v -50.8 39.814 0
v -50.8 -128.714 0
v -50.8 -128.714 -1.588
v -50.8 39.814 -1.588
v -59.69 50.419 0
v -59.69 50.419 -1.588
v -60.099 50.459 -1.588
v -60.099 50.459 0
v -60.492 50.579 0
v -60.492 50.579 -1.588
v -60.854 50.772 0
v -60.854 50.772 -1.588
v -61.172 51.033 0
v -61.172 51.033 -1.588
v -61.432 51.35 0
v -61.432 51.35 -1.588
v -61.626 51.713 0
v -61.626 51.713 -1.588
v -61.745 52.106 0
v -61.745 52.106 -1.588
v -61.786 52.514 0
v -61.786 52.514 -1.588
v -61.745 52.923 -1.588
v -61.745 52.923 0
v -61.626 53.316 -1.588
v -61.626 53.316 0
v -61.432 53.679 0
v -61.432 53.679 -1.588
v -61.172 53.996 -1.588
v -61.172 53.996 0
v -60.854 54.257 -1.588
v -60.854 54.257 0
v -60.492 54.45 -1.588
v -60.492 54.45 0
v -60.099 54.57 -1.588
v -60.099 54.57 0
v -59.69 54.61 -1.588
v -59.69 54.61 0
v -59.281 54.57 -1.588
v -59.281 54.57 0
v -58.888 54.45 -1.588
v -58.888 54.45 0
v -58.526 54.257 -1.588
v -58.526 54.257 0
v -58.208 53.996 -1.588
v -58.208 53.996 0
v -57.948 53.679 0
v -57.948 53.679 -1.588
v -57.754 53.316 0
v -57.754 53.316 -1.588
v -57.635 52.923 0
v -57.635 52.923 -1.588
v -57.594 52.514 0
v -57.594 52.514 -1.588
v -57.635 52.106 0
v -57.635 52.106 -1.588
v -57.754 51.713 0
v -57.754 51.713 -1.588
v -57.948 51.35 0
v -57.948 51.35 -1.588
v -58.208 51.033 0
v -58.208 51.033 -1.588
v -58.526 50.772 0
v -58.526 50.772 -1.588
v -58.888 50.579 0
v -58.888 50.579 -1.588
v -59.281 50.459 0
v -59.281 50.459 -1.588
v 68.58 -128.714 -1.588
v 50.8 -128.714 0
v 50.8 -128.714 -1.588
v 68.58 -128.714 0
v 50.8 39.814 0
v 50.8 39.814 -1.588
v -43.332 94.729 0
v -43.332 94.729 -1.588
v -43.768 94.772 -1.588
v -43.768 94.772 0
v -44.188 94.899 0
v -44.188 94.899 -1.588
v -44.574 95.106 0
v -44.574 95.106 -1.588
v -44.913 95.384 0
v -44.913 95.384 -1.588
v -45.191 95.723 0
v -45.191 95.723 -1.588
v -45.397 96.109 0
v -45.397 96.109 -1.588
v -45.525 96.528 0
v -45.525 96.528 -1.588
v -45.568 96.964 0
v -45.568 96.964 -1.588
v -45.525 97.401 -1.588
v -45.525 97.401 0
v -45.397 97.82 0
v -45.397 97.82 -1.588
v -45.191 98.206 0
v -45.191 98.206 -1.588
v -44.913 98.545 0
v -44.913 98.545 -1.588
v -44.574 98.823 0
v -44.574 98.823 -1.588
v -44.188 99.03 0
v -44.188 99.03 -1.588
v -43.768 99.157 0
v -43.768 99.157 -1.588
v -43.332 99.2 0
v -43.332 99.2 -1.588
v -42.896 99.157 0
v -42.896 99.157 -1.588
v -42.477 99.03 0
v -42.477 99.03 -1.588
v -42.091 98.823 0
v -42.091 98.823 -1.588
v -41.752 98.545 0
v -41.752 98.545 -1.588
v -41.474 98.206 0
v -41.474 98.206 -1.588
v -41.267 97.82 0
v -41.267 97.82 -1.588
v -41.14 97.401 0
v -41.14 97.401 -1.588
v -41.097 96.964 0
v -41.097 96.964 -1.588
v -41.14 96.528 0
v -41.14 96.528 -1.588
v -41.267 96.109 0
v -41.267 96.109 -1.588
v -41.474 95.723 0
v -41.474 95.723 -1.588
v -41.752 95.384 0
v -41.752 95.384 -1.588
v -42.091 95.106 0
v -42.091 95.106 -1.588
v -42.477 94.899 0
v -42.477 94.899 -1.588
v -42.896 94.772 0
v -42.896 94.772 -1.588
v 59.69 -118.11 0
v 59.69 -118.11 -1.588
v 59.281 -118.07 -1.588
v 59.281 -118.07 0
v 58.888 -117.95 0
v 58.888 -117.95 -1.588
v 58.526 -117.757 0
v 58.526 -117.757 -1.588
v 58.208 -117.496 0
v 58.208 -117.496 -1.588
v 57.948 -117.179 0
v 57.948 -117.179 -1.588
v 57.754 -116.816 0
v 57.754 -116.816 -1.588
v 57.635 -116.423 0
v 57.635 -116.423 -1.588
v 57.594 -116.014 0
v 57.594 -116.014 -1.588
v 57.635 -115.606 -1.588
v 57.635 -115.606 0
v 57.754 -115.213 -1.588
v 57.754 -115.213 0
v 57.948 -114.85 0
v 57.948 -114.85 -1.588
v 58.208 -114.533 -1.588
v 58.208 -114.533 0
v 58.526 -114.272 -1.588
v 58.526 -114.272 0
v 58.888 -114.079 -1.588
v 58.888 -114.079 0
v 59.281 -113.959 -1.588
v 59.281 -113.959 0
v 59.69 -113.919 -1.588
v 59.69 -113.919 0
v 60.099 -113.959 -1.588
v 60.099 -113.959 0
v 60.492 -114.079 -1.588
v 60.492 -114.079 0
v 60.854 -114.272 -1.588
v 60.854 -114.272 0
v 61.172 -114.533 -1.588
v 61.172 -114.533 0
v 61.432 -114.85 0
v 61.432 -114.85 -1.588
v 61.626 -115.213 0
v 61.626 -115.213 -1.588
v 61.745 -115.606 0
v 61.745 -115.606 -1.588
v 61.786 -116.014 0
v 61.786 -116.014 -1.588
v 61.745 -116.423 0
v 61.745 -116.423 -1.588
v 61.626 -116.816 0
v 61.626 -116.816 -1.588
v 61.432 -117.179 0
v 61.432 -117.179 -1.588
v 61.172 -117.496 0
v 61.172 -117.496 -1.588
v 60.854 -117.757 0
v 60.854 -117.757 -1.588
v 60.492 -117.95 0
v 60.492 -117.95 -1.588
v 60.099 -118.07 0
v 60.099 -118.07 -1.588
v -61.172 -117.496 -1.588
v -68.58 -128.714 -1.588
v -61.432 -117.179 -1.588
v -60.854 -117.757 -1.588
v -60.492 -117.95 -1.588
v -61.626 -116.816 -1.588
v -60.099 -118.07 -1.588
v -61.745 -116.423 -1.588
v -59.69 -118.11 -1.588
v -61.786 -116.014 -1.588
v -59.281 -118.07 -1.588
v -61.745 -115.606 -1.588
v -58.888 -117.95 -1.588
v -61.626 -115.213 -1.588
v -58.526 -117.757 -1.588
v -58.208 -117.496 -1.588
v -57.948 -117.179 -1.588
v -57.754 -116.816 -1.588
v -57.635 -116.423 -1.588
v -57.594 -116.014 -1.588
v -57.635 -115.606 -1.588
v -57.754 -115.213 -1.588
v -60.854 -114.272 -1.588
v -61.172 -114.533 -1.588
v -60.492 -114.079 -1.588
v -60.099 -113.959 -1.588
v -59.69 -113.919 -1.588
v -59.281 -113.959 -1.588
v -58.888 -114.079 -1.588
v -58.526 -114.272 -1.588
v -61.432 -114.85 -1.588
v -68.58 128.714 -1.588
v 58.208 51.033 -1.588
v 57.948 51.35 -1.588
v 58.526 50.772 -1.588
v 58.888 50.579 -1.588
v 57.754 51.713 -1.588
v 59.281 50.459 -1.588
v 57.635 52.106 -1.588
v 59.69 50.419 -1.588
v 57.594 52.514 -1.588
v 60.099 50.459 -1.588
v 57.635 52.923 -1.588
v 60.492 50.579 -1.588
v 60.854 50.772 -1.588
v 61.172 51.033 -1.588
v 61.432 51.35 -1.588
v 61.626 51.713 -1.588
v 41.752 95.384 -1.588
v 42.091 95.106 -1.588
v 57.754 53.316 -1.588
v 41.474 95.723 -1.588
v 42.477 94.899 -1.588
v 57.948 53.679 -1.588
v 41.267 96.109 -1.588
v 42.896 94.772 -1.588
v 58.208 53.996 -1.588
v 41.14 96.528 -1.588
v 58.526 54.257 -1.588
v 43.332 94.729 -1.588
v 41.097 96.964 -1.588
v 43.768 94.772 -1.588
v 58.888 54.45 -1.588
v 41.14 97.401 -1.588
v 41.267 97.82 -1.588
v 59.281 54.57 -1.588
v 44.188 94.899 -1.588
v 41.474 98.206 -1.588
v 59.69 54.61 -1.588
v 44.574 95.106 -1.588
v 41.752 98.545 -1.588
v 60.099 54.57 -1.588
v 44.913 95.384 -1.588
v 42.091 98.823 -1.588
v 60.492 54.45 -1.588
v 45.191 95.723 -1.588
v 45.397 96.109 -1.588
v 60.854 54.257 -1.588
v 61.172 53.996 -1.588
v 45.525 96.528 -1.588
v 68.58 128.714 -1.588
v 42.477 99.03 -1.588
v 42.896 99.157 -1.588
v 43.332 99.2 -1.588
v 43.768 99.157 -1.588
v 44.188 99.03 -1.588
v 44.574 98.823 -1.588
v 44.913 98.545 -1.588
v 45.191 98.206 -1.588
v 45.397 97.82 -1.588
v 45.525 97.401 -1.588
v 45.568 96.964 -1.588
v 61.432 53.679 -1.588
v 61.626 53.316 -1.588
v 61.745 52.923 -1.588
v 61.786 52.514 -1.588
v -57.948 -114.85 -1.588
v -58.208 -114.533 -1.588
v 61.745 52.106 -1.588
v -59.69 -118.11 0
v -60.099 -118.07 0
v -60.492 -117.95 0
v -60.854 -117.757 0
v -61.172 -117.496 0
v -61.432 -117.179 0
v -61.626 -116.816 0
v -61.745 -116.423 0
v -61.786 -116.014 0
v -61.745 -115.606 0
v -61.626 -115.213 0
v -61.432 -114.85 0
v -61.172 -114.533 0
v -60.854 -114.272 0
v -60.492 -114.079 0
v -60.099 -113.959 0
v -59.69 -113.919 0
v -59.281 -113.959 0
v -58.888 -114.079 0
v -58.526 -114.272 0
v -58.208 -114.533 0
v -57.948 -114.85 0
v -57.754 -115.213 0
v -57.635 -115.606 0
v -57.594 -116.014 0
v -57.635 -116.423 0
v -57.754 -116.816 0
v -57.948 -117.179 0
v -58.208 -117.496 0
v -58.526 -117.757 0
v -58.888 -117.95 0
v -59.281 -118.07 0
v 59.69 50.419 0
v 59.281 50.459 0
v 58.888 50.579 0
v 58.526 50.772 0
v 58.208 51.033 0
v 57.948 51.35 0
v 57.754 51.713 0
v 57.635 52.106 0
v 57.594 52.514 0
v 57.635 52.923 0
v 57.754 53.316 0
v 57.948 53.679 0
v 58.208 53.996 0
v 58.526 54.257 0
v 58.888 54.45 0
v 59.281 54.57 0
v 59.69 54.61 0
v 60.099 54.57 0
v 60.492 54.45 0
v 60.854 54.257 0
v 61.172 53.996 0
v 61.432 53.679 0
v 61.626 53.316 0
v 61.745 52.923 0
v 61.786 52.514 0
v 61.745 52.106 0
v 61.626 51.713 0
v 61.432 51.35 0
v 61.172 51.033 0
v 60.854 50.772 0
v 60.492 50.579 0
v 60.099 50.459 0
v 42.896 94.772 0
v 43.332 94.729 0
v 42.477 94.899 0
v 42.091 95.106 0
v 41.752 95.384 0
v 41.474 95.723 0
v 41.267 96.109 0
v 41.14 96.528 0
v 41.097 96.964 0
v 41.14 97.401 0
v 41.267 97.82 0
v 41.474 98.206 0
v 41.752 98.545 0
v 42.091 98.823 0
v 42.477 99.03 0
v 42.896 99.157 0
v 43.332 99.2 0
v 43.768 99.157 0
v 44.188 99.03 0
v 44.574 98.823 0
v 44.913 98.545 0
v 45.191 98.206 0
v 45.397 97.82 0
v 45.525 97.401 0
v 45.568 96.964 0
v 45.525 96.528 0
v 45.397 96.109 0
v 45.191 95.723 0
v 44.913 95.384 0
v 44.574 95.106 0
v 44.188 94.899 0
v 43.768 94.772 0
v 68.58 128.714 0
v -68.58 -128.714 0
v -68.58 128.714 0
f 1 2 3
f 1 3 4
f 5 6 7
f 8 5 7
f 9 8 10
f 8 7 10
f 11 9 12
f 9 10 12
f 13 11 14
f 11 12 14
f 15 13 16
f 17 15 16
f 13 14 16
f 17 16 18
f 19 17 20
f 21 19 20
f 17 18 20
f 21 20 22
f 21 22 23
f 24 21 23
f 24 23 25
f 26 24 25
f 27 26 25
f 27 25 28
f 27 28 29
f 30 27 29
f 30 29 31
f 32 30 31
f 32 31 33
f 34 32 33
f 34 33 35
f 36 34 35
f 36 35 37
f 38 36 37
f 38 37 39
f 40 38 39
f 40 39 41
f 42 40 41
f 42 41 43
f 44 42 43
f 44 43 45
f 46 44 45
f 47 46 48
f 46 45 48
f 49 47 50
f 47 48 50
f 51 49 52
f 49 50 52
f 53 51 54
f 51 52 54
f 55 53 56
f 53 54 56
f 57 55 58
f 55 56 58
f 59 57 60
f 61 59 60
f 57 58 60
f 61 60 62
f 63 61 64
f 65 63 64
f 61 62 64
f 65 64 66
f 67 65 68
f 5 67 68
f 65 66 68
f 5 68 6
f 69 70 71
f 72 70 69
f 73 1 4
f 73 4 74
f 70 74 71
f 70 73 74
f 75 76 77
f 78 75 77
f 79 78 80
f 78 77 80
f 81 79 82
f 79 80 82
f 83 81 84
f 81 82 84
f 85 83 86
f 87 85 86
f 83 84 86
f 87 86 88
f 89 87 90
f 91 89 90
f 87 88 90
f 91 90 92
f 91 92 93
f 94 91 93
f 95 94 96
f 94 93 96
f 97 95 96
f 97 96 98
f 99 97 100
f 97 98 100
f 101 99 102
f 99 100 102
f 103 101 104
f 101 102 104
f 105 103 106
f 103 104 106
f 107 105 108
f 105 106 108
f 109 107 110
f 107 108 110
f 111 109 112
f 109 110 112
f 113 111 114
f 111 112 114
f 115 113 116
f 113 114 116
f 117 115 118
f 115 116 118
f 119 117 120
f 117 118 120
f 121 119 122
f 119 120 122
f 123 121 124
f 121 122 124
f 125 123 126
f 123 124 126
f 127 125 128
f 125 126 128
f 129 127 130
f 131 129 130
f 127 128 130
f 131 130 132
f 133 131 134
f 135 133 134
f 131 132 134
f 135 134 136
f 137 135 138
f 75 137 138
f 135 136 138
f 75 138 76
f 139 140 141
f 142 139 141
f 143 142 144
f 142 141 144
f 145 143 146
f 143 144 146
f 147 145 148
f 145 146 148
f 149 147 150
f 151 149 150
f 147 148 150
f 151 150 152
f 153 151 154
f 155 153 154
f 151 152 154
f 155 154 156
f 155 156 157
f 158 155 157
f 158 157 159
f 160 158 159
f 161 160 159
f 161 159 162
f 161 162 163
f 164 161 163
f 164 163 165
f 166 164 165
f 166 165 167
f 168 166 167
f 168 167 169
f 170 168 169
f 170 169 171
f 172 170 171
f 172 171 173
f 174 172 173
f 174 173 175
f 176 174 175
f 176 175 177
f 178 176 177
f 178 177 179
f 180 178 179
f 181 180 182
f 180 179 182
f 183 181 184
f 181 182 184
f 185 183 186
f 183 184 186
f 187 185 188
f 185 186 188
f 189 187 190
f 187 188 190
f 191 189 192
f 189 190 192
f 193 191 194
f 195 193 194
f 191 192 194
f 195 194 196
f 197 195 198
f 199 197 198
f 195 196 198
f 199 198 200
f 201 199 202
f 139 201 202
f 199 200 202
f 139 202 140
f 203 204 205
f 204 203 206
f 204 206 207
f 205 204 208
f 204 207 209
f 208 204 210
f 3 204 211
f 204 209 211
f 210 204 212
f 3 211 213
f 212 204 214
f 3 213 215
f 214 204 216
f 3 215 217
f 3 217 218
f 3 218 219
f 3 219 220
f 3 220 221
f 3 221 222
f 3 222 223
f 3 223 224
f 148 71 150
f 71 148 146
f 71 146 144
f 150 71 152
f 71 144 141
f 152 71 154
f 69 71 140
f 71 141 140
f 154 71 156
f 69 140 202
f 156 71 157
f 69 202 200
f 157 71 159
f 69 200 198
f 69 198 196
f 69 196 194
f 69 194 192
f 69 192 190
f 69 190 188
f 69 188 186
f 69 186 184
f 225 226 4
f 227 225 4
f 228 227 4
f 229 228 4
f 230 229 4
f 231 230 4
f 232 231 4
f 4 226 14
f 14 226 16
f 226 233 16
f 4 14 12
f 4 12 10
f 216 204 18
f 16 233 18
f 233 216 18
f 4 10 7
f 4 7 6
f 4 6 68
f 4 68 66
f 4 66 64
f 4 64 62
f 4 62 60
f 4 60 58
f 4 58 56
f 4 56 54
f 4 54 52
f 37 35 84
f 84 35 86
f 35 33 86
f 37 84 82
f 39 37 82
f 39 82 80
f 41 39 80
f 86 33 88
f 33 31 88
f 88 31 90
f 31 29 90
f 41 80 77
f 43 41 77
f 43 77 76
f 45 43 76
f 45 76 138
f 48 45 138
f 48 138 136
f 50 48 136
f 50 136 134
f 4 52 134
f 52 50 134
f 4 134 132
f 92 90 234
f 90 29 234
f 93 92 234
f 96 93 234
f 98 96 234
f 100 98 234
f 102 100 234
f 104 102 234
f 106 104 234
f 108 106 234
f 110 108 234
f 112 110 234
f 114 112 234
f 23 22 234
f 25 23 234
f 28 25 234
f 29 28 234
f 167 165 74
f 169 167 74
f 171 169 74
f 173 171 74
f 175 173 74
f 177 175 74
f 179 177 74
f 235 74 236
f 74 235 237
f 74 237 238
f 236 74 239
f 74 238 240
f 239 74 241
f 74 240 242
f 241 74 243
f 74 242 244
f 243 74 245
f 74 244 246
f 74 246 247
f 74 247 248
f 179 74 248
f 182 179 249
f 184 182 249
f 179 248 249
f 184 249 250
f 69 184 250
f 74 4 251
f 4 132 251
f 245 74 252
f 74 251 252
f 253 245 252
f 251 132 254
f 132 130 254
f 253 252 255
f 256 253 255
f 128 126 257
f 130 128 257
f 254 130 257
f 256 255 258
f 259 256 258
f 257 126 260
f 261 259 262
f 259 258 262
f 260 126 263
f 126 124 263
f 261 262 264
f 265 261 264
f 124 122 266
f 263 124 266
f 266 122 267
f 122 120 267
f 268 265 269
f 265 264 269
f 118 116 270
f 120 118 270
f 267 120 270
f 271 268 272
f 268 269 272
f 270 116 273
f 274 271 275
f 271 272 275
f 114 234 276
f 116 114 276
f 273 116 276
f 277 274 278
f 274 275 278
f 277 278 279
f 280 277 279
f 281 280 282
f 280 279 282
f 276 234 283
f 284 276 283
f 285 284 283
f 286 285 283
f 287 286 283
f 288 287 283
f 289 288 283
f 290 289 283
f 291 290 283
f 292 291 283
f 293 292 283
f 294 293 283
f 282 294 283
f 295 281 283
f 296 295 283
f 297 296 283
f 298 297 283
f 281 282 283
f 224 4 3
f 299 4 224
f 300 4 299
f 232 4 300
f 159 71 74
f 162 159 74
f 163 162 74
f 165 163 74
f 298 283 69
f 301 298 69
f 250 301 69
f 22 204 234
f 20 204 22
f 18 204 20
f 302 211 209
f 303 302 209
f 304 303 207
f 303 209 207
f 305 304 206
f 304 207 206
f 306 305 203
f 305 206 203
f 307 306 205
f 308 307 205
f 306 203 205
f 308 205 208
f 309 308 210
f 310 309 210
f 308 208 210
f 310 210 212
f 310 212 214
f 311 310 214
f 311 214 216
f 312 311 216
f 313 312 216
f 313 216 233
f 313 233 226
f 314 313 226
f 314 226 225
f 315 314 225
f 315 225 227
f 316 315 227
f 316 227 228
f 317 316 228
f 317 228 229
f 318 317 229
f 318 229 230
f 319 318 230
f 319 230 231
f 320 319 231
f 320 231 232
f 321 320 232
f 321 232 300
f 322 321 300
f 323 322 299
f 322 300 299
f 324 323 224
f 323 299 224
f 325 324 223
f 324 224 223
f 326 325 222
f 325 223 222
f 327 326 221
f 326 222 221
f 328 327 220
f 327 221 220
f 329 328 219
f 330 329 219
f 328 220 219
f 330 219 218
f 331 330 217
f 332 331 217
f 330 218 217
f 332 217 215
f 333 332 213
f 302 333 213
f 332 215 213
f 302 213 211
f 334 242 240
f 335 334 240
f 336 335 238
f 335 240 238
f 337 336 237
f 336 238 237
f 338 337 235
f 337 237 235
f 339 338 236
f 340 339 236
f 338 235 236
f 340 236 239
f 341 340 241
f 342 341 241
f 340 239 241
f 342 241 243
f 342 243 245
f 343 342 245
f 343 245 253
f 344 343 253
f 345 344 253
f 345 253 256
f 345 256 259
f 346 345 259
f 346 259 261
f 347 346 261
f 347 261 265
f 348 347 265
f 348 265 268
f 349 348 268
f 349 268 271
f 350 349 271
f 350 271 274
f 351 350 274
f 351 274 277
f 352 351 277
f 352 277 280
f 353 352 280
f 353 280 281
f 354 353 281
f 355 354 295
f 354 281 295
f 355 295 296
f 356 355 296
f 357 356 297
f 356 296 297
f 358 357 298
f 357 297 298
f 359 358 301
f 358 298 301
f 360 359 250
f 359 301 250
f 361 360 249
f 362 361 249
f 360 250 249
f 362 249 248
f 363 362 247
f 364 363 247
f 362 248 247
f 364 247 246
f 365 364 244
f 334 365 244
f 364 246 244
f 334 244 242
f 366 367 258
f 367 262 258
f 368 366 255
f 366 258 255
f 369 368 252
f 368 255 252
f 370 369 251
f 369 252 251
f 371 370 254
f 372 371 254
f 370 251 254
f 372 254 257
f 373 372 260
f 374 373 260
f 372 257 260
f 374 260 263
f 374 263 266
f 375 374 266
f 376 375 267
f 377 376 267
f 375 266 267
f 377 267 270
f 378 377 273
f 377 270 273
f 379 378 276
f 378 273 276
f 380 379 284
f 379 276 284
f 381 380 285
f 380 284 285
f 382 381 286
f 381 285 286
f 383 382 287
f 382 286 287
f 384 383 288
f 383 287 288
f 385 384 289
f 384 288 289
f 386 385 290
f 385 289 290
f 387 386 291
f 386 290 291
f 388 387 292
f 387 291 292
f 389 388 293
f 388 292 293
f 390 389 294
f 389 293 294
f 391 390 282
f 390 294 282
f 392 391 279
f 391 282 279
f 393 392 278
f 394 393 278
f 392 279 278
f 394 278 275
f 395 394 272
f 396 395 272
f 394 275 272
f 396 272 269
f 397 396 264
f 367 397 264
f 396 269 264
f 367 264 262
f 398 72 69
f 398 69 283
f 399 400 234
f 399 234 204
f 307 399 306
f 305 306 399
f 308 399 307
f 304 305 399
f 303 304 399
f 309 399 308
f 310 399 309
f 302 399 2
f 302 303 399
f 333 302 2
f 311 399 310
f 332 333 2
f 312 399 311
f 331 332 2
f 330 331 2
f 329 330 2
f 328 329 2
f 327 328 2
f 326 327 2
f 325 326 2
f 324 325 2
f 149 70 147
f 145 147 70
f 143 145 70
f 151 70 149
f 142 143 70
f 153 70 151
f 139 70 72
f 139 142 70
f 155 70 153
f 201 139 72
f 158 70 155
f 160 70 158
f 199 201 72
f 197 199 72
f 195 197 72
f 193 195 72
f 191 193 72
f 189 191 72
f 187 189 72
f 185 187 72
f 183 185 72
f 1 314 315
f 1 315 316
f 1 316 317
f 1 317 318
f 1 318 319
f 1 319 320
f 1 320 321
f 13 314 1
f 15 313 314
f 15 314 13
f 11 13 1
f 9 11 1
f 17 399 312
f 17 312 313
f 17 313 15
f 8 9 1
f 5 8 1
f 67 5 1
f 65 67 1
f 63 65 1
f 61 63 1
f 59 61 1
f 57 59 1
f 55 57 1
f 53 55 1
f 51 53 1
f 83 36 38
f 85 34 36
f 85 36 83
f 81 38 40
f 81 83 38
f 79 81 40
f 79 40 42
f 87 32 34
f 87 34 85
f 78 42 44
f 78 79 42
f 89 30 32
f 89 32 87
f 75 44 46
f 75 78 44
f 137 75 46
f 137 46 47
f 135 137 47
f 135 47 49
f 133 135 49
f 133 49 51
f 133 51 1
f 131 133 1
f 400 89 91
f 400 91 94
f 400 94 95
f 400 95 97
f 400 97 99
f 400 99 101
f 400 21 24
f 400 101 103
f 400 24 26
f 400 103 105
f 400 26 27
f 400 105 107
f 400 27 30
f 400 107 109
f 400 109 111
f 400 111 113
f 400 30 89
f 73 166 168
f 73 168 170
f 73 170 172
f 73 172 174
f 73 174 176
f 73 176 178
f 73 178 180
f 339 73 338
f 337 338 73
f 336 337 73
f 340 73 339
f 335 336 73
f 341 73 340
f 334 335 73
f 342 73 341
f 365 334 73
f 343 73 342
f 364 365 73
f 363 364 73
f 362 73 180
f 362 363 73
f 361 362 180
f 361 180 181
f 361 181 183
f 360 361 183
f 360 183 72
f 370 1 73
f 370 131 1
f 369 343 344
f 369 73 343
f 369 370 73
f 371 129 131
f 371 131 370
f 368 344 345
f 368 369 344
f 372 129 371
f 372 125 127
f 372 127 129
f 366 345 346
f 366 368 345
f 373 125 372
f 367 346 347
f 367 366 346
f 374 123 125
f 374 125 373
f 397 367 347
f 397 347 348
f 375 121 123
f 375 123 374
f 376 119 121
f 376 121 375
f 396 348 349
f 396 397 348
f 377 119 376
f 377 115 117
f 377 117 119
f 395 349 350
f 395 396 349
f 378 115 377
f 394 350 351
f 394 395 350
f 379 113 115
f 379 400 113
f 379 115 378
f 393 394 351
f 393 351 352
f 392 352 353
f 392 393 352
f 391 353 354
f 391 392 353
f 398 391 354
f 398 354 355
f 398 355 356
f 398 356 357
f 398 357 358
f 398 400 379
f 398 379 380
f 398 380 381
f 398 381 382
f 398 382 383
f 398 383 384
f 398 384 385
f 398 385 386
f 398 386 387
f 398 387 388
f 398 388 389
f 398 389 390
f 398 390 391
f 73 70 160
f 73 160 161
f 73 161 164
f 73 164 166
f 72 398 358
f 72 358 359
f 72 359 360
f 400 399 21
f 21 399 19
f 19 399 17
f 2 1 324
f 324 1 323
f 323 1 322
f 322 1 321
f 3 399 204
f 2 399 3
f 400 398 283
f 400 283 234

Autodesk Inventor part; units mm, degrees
ref_plane "YZ Plane" through (0, 0, 0) normal (1, 0, 0) x (0, 1, 0)
ref_plane "XZ Plane" through (0, 0, 0) normal (0, 1, 0) x (-1, 0, 0)
ref_plane "XY Plane" through (0, 0, 0) normal (0, 0, 1) x (1, 0, 0)
sketch "Sketch1" plane through (0, 0, 0) normal (0, 0, 1) x (1, 0, 0)
  line L0 (-68.58, -128.7145) -> (68.58, -128.7145)
  line L1 (68.58, -128.7145) -> (68.58, 128.7145)
  line L2 (68.58, 128.7145) -> (-68.58, 128.7145)
  line L3 (-68.58, 128.7145) -> (-68.58, -128.7145)
  line L4 (-68.58, -128.7145) -> (68.58, 128.7145) construction
  line L5 (68.58, -128.7145) -> (-68.58, 128.7145) construction
  point P0 (0, 0)
  dimension "d0" = 137.16
  dimension "d1" = 257.429
extrude "Extrusion1" add sketch "Sketch1" against normal blind 1.5875
sketch "Sketch2" plane through (0, 0, 0) normal (0, 0, 1) x (1, 0, 0)
  circle A0 centre (-59.69, 52.5145) radius 2.0955
  line L0 (-68.58, 128.7145) -> (-68.58, -128.7145) projected
  line L1 (-68.58, 128.7145) -> (68.58, 128.7145) projected
  circle A1 centre (59.69, 52.5145) radius 2.0955
  line L2 (68.58, -128.7145) -> (68.58, 128.7145) projected
  circle A2 centre (-59.69, -116.0145) radius 2.0955
  circle A3 centre (59.69, -116.0145) radius 2.0955
  line L3 (-68.58, -128.7145) -> (68.58, -128.7145) projected
  point P0 (0, 0)
  dimension "d4" = 8.89
  dimension "d5" = 76.2
  dimension "d6" = 76.2
  dimension "d7" = 8.89
  dimension "d8" = 4.191
  dimension "d9" = 12.7
  dimension "d10" = 8.89
  dimension "d11" = 8.89
  dimension "d12" = 12.7
  dimension "d13" = 4.191
  dimension "d21" = 4.191
  dimension "d22" = 4.191
hole "Hole1" at (-59.69, 52.5145, 0) at (59.69, 52.5145, 0) at (-59.69, -116.0145, 0) at (59.69, -116.0145, 0) direction (0, 0, -1) diameter 4.191 end through all
sketch "Sketch4" plane through (0, 0, 0) normal (0, 0, 1) x (1, 0, 0)
  line L0 (-35.179, -49.0855) -> (-35.179, -99.8855)
  line L1 (-28.321, -49.0855) -> (-28.321, -99.8855)
  line L2 (28.321, -49.0855) -> (28.321, -99.8855)
  line L3 (35.179, -49.0855) -> (35.179, -99.8855)
  line L4 (-68.58, 128.7145) -> (-68.58, -128.7145) projected
  line L5 (68.58, -128.7145) -> (68.58, 128.7145) projected
  line L6 (-68.58, -128.7145) -> (68.58, -128.7145) projected
  arc A0 (-28.321, -49.0855) -> (-35.179, -49.0855) centre (-31.75, -49.0855) ccw
  arc A1 (-35.179, -99.8855) -> (-28.321, -99.8855) centre (-31.75, -99.8855) ccw
  arc A2 (35.179, -49.0855) -> (28.321, -49.0855) centre (31.75, -49.0855) ccw
  arc A3 (28.321, -99.8855) -> (35.179, -99.8855) centre (31.75, -99.8855) ccw
  point P0 (0, 0)
  dimension "d23" = 6.858
  dimension "d24" = 6.858
  dimension "d25" = 33.401
  dimension "d26" = 50.8
  dimension "d27" = 33.401
  dimension "d28" = 28.829
  dimension "d29" = 28.829
  dimension "d30" = 28.829
  dimension "d31" = 28.829
  dimension "d32" = 50.8
  dimension "d33" = 50.8
  dimension "d34" = 50.8
extrude "Extrusion2" cut sketch "Sketch4" against normal blind 3.175
sketch "Sketch5" plane through (0, 0, 0) normal (0, 0, 1) x (1, 0, 0)
  line L0 (-68.58, 128.7145) -> (68.58, 128.7145) projected
  line L1 (68.58, 128.7145) -> (68.58, -128.7145) projected
  point P0 (0, 0)
  point P1 (-43.3324, 96.9645)
  point P2 (43.3324, 96.9645)
  dimension "d37" = 31.75
  dimension "d38" = 86.6648
  dimension "d39" = 31.75
  dimension "d40" = 25.2476
hole "Hole2" at (-43.3324, 96.9645, 0) at (43.3324, 96.9645, 0) direction (0, 0, -1) diameter 4.4704 end through all
sketch "battery_buzzer" plane through (0, 0, 0) normal (0, 0, 1) x (1, 0, 0)
  point P0 (0, 0)
sketch "Sketch10" plane through (0, 0, 0) normal (0, 0, 1) x (1, 0, 0)
  line L0 (-50.8, -128.7145) -> (-50.8, 39.8145)
  line L1 (-50.8, 39.8145) -> (50.8, 39.8145)
  line L2 (50.8, 39.8145) -> (50.8, -128.7145)
  line L3 (68.58, 128.7145) -> (-68.58, 128.7145) projected
  line L4 (-68.58, 128.7145) -> (-68.58, -128.7145) projected
  line L5 (68.58, 128.7145) -> (68.58, -128.7145) projected
  line L6 (-50.8, -128.7145) -> (50.8, -128.7145)
  point P0 (0, 0)
  dimension "d48" = 88.9
  dimension "d49" = 17.78
  dimension "d50" = 17.78
extrude "Extrusion3" cut sketch "Sketch10" against normal blind 3.175
